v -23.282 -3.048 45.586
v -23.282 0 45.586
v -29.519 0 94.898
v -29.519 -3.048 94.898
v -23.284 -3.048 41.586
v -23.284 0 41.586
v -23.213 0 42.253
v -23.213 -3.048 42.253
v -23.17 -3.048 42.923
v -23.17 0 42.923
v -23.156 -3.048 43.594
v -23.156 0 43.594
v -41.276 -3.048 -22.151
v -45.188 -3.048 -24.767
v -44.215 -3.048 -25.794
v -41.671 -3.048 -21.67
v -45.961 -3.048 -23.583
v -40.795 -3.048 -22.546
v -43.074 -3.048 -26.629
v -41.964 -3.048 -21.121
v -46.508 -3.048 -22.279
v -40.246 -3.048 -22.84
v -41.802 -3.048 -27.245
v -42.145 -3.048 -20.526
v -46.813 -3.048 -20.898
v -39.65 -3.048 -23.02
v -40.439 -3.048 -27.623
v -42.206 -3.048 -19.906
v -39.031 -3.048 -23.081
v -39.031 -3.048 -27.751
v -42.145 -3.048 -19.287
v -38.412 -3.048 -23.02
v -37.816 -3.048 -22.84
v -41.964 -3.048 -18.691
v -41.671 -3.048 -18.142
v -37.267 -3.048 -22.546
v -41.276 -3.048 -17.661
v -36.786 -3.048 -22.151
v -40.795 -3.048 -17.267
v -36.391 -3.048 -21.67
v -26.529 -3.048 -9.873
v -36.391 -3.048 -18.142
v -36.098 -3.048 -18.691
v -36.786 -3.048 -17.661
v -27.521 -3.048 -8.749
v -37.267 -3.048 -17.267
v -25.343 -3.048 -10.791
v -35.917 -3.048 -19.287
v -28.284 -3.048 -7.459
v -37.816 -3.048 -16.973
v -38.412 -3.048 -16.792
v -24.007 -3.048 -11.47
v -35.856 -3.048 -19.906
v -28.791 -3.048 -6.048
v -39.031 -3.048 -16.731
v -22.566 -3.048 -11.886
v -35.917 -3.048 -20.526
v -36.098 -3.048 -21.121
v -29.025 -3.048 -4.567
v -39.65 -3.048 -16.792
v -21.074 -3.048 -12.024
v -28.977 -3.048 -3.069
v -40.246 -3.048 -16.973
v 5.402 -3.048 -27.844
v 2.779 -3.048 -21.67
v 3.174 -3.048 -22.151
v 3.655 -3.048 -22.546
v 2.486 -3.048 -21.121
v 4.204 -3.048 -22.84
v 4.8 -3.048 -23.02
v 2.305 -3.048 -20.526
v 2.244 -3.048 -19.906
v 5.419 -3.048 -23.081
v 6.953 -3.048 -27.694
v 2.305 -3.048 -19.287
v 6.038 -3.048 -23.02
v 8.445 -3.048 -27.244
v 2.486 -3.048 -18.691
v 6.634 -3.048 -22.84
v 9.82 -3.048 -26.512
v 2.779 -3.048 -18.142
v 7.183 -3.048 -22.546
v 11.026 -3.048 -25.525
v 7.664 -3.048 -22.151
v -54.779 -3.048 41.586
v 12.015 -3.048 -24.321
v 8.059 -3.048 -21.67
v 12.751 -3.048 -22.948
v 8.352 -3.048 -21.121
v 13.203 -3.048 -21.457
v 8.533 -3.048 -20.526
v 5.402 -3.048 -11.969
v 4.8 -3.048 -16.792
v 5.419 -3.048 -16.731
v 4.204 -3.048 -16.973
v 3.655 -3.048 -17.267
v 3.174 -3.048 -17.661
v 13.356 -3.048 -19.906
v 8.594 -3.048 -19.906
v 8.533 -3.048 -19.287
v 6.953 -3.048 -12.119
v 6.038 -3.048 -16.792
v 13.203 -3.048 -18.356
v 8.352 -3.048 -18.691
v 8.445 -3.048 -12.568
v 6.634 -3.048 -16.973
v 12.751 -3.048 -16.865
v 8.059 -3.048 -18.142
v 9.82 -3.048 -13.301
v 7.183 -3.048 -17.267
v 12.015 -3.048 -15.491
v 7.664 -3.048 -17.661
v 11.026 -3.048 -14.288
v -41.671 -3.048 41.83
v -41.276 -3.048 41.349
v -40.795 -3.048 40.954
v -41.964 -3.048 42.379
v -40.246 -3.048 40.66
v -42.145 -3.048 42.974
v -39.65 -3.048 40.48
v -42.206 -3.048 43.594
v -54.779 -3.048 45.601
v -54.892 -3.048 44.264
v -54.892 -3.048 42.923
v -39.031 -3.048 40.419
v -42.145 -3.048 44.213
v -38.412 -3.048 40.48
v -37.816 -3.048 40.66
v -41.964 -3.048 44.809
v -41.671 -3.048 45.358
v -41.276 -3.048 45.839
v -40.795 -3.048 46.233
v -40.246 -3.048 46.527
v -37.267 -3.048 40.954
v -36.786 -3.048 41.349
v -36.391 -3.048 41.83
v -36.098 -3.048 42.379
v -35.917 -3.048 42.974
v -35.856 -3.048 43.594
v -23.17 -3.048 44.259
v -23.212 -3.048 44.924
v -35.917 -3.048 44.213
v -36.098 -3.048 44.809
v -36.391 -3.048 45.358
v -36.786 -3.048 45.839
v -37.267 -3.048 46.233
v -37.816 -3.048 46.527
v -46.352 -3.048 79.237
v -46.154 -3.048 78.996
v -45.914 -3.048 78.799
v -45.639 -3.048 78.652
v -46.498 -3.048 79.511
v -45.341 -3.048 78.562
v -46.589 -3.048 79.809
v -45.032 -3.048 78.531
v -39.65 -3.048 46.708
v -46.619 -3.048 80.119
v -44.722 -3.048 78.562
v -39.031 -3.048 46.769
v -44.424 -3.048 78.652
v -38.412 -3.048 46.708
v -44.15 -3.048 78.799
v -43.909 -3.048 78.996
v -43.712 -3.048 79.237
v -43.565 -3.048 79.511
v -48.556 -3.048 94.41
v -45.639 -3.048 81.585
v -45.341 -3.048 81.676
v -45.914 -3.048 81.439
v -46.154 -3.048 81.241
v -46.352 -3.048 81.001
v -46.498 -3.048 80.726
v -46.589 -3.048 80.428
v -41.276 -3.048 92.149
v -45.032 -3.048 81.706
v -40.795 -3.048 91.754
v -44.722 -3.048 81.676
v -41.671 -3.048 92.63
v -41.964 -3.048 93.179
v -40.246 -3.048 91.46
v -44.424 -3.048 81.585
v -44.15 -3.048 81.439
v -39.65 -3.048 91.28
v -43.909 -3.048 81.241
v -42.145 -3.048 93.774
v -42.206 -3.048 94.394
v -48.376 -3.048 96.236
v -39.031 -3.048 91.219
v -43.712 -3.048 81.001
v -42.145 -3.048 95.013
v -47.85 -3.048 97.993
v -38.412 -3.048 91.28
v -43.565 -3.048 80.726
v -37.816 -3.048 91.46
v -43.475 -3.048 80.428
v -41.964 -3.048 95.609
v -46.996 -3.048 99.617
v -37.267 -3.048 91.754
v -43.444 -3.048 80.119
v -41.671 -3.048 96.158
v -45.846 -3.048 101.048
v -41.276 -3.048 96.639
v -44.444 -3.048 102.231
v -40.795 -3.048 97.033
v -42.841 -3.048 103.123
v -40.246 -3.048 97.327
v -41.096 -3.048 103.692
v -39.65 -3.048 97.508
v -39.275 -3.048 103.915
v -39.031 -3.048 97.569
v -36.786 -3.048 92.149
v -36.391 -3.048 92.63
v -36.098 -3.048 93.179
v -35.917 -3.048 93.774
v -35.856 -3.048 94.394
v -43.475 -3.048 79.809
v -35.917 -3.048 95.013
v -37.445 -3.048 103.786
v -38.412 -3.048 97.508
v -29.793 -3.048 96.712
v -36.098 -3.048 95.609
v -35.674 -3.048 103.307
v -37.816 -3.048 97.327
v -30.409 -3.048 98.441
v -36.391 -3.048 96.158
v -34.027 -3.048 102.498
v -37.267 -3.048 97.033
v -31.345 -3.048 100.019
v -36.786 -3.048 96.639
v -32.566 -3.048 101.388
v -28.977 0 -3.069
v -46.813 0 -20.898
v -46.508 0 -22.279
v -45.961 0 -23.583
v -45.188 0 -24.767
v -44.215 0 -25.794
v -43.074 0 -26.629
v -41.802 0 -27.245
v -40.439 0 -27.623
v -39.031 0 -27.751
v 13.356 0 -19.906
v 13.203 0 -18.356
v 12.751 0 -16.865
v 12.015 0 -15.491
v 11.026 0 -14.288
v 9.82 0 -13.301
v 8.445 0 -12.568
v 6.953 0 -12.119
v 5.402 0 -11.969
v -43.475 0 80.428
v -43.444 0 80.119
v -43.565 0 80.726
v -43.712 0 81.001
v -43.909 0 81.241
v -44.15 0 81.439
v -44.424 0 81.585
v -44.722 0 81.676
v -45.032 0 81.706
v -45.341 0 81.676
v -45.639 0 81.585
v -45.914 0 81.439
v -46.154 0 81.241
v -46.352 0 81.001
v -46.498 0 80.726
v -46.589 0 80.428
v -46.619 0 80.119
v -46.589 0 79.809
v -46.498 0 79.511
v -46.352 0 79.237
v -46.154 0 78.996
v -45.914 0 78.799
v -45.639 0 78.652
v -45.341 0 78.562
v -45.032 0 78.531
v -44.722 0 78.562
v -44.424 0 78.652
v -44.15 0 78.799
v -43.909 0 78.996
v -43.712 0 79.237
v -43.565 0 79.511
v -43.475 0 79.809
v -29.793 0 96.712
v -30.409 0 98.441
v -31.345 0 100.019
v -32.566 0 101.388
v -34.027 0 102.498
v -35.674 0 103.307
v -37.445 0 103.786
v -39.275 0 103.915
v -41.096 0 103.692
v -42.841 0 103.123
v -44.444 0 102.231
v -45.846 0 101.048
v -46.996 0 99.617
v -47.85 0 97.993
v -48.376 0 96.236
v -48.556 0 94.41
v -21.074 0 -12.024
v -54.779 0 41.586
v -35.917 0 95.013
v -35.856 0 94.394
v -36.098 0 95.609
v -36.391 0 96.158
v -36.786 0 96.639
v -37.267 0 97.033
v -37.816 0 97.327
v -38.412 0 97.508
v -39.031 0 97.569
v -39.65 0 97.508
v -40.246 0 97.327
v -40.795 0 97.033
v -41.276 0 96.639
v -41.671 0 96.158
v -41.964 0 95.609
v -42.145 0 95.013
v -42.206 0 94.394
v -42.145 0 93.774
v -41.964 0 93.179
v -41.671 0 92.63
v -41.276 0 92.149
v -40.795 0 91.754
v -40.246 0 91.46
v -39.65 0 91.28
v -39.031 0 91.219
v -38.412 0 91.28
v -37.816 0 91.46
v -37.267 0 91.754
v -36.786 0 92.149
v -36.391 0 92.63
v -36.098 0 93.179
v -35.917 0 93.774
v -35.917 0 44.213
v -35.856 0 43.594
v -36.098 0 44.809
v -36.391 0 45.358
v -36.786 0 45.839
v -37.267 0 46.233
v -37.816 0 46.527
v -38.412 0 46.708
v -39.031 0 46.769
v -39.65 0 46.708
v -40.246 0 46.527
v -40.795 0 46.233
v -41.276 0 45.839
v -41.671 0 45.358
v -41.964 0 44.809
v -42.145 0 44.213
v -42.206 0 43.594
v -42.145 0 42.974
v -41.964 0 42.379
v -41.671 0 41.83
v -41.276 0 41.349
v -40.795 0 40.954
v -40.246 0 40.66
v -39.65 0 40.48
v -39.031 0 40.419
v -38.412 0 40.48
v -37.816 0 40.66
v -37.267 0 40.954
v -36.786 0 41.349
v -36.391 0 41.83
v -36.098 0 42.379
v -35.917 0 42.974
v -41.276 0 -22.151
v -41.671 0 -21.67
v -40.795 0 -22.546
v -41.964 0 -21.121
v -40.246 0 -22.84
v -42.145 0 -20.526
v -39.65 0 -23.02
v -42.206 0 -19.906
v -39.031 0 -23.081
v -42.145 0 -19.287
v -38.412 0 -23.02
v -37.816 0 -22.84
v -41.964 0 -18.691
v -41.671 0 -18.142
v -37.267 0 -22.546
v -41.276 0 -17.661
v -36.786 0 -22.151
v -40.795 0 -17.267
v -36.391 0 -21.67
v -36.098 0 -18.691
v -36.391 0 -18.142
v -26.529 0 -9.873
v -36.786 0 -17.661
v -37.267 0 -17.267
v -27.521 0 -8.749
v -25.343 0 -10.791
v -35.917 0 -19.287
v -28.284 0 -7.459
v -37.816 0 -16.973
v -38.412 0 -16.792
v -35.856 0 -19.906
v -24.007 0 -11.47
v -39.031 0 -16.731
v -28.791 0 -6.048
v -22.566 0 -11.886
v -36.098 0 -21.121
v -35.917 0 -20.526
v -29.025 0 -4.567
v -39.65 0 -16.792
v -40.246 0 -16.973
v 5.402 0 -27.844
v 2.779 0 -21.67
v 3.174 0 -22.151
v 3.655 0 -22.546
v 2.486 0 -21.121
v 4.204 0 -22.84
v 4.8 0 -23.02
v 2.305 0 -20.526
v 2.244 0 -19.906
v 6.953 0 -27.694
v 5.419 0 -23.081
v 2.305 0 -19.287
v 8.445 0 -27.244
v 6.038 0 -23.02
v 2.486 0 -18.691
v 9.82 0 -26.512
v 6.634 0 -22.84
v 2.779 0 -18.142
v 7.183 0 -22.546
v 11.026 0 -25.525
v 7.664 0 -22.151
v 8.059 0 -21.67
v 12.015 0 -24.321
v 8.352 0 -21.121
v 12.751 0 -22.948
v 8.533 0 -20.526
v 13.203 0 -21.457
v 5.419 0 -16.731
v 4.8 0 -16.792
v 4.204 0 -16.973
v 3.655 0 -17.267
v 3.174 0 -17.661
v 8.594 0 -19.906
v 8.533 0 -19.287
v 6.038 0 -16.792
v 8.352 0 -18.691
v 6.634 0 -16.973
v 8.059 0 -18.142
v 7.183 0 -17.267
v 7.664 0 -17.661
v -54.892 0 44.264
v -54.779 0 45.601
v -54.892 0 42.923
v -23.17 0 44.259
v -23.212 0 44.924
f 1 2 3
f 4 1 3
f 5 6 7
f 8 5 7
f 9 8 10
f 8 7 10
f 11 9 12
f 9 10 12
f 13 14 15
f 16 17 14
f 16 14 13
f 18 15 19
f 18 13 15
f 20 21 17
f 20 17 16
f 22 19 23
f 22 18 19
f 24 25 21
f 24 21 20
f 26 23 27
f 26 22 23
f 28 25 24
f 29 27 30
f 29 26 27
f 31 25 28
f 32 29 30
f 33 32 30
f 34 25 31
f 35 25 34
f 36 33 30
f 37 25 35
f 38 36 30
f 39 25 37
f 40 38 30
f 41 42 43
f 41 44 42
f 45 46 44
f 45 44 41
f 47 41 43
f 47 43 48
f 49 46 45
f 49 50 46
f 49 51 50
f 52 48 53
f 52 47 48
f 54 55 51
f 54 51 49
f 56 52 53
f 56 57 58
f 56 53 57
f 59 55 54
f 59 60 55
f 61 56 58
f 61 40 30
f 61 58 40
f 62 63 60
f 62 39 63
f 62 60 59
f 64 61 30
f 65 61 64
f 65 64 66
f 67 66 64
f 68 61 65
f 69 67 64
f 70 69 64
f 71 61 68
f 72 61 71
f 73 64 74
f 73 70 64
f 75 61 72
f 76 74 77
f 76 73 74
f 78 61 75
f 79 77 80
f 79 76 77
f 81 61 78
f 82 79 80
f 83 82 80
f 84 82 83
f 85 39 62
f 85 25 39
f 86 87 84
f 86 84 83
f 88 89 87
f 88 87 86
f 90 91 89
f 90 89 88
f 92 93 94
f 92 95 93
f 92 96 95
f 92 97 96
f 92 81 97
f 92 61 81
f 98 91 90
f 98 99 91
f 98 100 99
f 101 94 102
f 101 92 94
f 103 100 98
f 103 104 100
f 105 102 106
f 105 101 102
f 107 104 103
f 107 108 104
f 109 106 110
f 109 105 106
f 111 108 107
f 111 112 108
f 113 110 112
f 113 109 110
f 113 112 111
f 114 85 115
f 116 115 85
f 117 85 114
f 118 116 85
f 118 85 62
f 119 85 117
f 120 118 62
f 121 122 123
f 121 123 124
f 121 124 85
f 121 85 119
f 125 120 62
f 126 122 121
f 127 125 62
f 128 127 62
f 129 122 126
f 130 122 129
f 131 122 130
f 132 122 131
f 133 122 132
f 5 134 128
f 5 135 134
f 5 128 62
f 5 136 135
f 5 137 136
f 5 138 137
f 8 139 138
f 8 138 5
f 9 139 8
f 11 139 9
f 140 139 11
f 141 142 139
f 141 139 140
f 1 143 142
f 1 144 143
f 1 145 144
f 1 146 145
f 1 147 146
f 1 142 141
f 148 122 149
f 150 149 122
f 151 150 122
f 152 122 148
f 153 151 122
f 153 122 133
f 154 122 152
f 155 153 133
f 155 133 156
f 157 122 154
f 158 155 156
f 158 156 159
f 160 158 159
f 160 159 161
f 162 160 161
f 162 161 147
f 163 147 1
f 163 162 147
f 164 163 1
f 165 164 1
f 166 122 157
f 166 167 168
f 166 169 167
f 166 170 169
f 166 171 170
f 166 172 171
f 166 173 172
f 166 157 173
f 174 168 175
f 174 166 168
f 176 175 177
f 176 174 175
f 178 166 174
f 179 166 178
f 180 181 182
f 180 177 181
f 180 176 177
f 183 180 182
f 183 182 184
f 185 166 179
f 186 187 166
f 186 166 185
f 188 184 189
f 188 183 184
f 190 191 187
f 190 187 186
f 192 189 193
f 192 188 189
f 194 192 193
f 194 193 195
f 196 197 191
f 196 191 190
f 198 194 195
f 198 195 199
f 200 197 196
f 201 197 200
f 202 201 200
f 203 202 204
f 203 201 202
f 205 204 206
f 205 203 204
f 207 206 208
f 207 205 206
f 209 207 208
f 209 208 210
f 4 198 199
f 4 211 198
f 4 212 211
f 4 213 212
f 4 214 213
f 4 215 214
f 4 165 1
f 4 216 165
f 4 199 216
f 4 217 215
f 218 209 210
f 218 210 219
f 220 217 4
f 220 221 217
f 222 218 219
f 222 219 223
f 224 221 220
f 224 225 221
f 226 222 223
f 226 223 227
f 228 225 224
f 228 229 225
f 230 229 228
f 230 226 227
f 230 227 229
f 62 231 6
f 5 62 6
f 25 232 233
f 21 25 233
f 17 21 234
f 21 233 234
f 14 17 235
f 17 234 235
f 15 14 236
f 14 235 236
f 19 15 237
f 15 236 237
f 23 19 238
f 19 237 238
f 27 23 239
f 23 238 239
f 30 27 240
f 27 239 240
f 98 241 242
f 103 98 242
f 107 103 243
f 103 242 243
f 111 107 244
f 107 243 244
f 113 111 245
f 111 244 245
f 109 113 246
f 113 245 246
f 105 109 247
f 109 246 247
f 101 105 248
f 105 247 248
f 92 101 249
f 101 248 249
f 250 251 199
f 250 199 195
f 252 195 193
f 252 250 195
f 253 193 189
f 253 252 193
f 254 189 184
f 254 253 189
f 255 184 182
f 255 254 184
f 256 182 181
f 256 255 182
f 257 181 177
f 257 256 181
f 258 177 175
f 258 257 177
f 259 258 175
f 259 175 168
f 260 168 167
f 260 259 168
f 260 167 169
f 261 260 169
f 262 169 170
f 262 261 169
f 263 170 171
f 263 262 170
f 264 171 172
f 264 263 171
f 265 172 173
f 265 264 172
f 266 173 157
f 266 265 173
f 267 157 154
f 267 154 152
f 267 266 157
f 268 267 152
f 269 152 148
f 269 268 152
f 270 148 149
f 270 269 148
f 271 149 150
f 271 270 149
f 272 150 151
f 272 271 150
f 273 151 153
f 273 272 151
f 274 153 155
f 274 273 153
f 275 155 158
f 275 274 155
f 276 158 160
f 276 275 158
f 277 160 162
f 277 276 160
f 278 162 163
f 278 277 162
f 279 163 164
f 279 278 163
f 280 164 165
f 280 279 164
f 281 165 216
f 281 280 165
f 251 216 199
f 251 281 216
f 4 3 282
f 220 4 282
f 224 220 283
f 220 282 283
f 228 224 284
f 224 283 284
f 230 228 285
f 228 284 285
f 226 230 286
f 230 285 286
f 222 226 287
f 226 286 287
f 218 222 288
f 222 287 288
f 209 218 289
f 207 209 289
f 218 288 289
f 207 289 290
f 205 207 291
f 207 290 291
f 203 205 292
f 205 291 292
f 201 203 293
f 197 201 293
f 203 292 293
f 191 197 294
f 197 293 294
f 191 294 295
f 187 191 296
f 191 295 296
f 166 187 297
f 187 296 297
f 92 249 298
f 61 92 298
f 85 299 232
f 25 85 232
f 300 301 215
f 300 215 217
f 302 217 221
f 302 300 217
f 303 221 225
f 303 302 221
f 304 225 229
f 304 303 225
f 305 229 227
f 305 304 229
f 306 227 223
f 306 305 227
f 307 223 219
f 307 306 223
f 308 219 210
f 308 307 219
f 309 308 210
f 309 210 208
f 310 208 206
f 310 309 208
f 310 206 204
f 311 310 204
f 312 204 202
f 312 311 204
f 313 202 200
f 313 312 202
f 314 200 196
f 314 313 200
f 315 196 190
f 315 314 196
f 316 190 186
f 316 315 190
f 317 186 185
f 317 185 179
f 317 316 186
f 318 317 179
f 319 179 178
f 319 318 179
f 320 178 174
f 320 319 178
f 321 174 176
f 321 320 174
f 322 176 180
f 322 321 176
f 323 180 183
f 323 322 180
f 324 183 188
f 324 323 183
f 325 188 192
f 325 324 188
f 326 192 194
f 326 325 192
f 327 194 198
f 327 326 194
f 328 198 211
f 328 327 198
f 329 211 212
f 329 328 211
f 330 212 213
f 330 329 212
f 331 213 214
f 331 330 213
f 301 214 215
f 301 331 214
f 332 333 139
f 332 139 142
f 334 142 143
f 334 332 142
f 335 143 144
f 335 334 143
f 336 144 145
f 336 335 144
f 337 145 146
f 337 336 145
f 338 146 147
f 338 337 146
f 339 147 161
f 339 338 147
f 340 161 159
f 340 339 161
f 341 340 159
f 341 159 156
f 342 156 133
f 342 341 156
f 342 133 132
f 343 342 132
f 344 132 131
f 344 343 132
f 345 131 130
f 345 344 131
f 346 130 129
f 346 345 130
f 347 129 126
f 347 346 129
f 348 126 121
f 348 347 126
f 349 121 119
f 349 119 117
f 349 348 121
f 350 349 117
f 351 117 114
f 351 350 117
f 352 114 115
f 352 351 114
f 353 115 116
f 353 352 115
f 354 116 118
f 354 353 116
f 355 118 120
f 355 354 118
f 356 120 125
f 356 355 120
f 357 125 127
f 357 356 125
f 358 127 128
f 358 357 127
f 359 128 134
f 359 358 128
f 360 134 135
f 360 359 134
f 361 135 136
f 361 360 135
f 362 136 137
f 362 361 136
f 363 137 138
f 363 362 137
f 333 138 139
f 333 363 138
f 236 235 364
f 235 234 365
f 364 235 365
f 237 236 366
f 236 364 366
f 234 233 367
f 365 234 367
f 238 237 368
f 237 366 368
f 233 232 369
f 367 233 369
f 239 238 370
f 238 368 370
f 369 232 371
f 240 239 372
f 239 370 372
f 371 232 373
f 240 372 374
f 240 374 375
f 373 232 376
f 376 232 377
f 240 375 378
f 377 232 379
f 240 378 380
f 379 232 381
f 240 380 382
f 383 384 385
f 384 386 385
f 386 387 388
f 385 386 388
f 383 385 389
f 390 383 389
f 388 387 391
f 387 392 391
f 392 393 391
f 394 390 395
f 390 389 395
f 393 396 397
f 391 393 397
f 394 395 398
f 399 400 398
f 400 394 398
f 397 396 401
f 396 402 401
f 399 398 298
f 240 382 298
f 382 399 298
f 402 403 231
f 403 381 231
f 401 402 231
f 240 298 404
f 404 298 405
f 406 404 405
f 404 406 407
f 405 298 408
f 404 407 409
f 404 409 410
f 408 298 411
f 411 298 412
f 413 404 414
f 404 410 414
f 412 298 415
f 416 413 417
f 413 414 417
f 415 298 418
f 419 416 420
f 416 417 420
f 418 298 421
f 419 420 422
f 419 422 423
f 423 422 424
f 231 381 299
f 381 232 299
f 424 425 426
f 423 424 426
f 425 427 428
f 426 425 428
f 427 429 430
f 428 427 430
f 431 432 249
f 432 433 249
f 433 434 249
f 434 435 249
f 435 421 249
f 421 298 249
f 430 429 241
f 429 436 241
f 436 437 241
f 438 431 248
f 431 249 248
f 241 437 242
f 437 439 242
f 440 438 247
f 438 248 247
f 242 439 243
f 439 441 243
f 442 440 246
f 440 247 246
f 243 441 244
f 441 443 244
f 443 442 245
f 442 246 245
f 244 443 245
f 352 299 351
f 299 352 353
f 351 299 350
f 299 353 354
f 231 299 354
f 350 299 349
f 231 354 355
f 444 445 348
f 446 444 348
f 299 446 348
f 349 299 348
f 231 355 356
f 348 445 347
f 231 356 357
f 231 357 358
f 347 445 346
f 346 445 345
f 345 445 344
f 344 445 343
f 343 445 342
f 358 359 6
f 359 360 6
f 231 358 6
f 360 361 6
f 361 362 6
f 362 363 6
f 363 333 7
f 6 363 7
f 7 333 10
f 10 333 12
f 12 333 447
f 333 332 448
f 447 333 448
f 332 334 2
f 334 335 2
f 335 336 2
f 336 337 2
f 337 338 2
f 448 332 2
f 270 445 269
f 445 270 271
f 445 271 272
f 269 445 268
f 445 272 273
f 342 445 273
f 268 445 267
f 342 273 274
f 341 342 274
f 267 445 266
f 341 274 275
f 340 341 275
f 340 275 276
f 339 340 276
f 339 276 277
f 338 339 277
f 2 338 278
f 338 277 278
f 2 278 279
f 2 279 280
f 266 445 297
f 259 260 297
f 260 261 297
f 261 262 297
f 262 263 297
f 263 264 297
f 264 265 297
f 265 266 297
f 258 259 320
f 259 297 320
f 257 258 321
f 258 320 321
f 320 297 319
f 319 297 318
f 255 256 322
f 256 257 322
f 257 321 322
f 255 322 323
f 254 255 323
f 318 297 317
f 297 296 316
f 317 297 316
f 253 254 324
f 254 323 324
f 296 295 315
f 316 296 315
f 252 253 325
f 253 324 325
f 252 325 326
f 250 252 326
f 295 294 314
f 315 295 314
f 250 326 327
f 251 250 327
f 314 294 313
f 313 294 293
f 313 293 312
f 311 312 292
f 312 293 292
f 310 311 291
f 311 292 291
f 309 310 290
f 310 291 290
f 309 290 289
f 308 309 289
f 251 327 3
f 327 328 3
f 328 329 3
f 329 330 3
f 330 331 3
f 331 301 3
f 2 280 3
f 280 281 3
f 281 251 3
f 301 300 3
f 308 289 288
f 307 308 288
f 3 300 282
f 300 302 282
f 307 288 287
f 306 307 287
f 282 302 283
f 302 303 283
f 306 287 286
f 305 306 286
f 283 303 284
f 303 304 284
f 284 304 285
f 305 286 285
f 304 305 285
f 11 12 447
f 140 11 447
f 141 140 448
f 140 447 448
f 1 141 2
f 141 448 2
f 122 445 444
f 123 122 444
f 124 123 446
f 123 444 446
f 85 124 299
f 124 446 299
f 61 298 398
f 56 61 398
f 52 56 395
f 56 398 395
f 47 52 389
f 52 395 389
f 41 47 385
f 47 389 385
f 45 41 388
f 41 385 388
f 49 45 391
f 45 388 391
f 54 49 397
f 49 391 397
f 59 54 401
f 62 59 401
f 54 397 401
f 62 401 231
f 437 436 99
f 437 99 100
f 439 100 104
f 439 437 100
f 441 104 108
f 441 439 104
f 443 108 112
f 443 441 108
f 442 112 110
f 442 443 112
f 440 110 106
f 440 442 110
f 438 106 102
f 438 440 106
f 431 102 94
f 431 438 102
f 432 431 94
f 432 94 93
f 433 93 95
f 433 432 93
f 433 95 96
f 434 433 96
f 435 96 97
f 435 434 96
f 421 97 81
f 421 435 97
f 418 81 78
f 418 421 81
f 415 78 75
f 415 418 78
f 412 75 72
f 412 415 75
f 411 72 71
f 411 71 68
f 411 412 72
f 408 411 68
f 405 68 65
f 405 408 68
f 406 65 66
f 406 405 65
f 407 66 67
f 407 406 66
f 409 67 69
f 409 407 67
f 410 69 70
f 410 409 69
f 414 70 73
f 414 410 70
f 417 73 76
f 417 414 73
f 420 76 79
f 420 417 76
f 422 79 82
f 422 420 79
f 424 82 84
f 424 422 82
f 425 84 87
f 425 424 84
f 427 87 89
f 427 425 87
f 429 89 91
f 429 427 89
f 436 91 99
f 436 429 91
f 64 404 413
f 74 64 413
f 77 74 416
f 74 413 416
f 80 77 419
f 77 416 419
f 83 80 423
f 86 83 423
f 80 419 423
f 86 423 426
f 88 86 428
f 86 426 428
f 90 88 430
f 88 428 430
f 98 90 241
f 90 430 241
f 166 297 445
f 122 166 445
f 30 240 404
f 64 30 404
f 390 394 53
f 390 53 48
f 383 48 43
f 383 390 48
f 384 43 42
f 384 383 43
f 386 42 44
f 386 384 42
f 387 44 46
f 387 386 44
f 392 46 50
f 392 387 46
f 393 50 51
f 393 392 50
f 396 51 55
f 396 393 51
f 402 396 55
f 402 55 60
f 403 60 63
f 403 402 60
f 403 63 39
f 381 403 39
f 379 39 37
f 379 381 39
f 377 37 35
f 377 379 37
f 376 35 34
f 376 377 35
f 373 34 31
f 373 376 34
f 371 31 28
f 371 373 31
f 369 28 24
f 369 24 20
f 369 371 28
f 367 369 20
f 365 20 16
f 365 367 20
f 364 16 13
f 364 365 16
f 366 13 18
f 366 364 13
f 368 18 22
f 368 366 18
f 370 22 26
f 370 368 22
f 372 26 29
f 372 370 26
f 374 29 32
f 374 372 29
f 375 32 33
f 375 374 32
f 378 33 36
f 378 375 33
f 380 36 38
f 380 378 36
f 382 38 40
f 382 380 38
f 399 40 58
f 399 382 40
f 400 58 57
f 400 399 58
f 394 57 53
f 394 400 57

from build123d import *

# Parameters (mm, degrees)
F0_R     = 3.175
F0_R_2   = 1.5875
F1_DEPTH = 3.048


with BuildPart() as f1:
    # F0 (on Front) → F1 (new body)
    with BuildSketch(Plane.XZ):
        with BuildLine():
            ThreePointArc((-48.556072, 94.40956), (-39.039076, 84.868582), (-29.506085, 94.393578))
            ThreePointArc((-29.506085, 94.393578), (-29.509424, 94.645752), (-29.519438, 94.897749))
            ThreePointArc((-29.519438, 94.897749), (-39.275271, 103.915448), (-48.556072, 94.40956))
        make_face()
        with Locations((-39.031085, 94.393578)):
            Circle(F0_R, mode=Mode.SUBTRACT)
        with BuildLine():
            ThreePointArc((-29.519438, 94.897749), (-29.509424, 94.645752), (-29.506085, 94.393578))
            ThreePointArc((-29.506085, 94.393578), (-39.039076, 84.868582), (-48.556072, 94.40956))
            Line((-48.556072, 94.40956), (-54.778624, 45.601225))
            ThreePointArc((-54.778624, 45.601225), (-39.023338, 59.468576), (-23.281594, 45.585853))
            Line((-23.281594, 45.585853), (-29.519438, 94.897749))
        make_face()
        with Locations((-45.03163, 80.118778)):
            Circle(F0_R_2, mode=Mode.SUBTRACT)
        with BuildLine():
            ThreePointArc((-23.156085, 43.593578), (-23.187494, 44.59169), (-23.281594, 45.585853))
            ThreePointArc((-23.281594, 45.585853), (-39.023338, 59.468576), (-54.778624, 45.601225))
            ThreePointArc((-54.778624, 45.601225), (-54.906085, 43.593578), (-54.778624, 41.585932))
            ThreePointArc((-54.778624, 41.585932), (-39.031085, 27.718578), (-23.283546, 41.585932))
            ThreePointArc((-23.283546, 41.585932), (-23.187983, 42.587734), (-23.156085, 43.593578))
        make_face()
        with Locations((-39.031085, 43.593578)):
            Circle(F0_R, mode=Mode.SUBTRACT)
        with BuildLine():
            ThreePointArc((-23.283546, 41.585932), (-39.031085, 27.718578), (-54.778624, 41.585932))
            Line((-54.778624, 41.585932), (-46.812516, -20.898473))
            ThreePointArc((-46.812516, -20.898473), (-39.52811, -12.077769), (-31.186671, -19.906422))
            ThreePointArc((-31.186671, -19.906422), (-33.484247, -25.45326), (-39.031085, -27.750836))
            Line((-39.031085, -27.750836), (5.402289, -27.843904))
            ThreePointArc((5.402289, -27.843904), (-2.518585, -19.906422), (5.402289, -11.968939))
            Line((5.402289, -11.968939), (-21.073536, -12.024395))
            ThreePointArc((-21.073536, -12.024395), (-27.051216, -9.334614), (-28.976555, -3.068783))
            Line((-28.976555, -3.068783), (-23.283546, 41.585932))
        make_face()
        with BuildLine():
            ThreePointArc((-31.186671, -19.906422), (-39.52811, -12.077769), (-46.812516, -20.898473))
            ThreePointArc((-46.812516, -20.898473), (-44.215329, -25.793564), (-39.031085, -27.750836))
            ThreePointArc((-39.031085, -27.750836), (-33.484247, -25.45326), (-31.186671, -19.906422))
        make_face()
        with Locations((-39.031085, -19.906422)):
            Circle(F0_R, mode=Mode.SUBTRACT)
        with BuildLine():
            ThreePointArc((5.402289, -11.968939), (-2.518585, -19.906422), (5.402289, -27.843904))
            ThreePointArc((5.402289, -27.843904), (11.025694, -25.524957), (13.356415, -19.906422))
            ThreePointArc((13.356415, -19.906422), (11.025694, -14.287887), (5.402289, -11.968939))
        make_face()
        with Locations((5.418915, -19.906422)):
            Circle(F0_R, mode=Mode.SUBTRACT)
    extrude(amount=F1_DEPTH)


solid = f1.part
